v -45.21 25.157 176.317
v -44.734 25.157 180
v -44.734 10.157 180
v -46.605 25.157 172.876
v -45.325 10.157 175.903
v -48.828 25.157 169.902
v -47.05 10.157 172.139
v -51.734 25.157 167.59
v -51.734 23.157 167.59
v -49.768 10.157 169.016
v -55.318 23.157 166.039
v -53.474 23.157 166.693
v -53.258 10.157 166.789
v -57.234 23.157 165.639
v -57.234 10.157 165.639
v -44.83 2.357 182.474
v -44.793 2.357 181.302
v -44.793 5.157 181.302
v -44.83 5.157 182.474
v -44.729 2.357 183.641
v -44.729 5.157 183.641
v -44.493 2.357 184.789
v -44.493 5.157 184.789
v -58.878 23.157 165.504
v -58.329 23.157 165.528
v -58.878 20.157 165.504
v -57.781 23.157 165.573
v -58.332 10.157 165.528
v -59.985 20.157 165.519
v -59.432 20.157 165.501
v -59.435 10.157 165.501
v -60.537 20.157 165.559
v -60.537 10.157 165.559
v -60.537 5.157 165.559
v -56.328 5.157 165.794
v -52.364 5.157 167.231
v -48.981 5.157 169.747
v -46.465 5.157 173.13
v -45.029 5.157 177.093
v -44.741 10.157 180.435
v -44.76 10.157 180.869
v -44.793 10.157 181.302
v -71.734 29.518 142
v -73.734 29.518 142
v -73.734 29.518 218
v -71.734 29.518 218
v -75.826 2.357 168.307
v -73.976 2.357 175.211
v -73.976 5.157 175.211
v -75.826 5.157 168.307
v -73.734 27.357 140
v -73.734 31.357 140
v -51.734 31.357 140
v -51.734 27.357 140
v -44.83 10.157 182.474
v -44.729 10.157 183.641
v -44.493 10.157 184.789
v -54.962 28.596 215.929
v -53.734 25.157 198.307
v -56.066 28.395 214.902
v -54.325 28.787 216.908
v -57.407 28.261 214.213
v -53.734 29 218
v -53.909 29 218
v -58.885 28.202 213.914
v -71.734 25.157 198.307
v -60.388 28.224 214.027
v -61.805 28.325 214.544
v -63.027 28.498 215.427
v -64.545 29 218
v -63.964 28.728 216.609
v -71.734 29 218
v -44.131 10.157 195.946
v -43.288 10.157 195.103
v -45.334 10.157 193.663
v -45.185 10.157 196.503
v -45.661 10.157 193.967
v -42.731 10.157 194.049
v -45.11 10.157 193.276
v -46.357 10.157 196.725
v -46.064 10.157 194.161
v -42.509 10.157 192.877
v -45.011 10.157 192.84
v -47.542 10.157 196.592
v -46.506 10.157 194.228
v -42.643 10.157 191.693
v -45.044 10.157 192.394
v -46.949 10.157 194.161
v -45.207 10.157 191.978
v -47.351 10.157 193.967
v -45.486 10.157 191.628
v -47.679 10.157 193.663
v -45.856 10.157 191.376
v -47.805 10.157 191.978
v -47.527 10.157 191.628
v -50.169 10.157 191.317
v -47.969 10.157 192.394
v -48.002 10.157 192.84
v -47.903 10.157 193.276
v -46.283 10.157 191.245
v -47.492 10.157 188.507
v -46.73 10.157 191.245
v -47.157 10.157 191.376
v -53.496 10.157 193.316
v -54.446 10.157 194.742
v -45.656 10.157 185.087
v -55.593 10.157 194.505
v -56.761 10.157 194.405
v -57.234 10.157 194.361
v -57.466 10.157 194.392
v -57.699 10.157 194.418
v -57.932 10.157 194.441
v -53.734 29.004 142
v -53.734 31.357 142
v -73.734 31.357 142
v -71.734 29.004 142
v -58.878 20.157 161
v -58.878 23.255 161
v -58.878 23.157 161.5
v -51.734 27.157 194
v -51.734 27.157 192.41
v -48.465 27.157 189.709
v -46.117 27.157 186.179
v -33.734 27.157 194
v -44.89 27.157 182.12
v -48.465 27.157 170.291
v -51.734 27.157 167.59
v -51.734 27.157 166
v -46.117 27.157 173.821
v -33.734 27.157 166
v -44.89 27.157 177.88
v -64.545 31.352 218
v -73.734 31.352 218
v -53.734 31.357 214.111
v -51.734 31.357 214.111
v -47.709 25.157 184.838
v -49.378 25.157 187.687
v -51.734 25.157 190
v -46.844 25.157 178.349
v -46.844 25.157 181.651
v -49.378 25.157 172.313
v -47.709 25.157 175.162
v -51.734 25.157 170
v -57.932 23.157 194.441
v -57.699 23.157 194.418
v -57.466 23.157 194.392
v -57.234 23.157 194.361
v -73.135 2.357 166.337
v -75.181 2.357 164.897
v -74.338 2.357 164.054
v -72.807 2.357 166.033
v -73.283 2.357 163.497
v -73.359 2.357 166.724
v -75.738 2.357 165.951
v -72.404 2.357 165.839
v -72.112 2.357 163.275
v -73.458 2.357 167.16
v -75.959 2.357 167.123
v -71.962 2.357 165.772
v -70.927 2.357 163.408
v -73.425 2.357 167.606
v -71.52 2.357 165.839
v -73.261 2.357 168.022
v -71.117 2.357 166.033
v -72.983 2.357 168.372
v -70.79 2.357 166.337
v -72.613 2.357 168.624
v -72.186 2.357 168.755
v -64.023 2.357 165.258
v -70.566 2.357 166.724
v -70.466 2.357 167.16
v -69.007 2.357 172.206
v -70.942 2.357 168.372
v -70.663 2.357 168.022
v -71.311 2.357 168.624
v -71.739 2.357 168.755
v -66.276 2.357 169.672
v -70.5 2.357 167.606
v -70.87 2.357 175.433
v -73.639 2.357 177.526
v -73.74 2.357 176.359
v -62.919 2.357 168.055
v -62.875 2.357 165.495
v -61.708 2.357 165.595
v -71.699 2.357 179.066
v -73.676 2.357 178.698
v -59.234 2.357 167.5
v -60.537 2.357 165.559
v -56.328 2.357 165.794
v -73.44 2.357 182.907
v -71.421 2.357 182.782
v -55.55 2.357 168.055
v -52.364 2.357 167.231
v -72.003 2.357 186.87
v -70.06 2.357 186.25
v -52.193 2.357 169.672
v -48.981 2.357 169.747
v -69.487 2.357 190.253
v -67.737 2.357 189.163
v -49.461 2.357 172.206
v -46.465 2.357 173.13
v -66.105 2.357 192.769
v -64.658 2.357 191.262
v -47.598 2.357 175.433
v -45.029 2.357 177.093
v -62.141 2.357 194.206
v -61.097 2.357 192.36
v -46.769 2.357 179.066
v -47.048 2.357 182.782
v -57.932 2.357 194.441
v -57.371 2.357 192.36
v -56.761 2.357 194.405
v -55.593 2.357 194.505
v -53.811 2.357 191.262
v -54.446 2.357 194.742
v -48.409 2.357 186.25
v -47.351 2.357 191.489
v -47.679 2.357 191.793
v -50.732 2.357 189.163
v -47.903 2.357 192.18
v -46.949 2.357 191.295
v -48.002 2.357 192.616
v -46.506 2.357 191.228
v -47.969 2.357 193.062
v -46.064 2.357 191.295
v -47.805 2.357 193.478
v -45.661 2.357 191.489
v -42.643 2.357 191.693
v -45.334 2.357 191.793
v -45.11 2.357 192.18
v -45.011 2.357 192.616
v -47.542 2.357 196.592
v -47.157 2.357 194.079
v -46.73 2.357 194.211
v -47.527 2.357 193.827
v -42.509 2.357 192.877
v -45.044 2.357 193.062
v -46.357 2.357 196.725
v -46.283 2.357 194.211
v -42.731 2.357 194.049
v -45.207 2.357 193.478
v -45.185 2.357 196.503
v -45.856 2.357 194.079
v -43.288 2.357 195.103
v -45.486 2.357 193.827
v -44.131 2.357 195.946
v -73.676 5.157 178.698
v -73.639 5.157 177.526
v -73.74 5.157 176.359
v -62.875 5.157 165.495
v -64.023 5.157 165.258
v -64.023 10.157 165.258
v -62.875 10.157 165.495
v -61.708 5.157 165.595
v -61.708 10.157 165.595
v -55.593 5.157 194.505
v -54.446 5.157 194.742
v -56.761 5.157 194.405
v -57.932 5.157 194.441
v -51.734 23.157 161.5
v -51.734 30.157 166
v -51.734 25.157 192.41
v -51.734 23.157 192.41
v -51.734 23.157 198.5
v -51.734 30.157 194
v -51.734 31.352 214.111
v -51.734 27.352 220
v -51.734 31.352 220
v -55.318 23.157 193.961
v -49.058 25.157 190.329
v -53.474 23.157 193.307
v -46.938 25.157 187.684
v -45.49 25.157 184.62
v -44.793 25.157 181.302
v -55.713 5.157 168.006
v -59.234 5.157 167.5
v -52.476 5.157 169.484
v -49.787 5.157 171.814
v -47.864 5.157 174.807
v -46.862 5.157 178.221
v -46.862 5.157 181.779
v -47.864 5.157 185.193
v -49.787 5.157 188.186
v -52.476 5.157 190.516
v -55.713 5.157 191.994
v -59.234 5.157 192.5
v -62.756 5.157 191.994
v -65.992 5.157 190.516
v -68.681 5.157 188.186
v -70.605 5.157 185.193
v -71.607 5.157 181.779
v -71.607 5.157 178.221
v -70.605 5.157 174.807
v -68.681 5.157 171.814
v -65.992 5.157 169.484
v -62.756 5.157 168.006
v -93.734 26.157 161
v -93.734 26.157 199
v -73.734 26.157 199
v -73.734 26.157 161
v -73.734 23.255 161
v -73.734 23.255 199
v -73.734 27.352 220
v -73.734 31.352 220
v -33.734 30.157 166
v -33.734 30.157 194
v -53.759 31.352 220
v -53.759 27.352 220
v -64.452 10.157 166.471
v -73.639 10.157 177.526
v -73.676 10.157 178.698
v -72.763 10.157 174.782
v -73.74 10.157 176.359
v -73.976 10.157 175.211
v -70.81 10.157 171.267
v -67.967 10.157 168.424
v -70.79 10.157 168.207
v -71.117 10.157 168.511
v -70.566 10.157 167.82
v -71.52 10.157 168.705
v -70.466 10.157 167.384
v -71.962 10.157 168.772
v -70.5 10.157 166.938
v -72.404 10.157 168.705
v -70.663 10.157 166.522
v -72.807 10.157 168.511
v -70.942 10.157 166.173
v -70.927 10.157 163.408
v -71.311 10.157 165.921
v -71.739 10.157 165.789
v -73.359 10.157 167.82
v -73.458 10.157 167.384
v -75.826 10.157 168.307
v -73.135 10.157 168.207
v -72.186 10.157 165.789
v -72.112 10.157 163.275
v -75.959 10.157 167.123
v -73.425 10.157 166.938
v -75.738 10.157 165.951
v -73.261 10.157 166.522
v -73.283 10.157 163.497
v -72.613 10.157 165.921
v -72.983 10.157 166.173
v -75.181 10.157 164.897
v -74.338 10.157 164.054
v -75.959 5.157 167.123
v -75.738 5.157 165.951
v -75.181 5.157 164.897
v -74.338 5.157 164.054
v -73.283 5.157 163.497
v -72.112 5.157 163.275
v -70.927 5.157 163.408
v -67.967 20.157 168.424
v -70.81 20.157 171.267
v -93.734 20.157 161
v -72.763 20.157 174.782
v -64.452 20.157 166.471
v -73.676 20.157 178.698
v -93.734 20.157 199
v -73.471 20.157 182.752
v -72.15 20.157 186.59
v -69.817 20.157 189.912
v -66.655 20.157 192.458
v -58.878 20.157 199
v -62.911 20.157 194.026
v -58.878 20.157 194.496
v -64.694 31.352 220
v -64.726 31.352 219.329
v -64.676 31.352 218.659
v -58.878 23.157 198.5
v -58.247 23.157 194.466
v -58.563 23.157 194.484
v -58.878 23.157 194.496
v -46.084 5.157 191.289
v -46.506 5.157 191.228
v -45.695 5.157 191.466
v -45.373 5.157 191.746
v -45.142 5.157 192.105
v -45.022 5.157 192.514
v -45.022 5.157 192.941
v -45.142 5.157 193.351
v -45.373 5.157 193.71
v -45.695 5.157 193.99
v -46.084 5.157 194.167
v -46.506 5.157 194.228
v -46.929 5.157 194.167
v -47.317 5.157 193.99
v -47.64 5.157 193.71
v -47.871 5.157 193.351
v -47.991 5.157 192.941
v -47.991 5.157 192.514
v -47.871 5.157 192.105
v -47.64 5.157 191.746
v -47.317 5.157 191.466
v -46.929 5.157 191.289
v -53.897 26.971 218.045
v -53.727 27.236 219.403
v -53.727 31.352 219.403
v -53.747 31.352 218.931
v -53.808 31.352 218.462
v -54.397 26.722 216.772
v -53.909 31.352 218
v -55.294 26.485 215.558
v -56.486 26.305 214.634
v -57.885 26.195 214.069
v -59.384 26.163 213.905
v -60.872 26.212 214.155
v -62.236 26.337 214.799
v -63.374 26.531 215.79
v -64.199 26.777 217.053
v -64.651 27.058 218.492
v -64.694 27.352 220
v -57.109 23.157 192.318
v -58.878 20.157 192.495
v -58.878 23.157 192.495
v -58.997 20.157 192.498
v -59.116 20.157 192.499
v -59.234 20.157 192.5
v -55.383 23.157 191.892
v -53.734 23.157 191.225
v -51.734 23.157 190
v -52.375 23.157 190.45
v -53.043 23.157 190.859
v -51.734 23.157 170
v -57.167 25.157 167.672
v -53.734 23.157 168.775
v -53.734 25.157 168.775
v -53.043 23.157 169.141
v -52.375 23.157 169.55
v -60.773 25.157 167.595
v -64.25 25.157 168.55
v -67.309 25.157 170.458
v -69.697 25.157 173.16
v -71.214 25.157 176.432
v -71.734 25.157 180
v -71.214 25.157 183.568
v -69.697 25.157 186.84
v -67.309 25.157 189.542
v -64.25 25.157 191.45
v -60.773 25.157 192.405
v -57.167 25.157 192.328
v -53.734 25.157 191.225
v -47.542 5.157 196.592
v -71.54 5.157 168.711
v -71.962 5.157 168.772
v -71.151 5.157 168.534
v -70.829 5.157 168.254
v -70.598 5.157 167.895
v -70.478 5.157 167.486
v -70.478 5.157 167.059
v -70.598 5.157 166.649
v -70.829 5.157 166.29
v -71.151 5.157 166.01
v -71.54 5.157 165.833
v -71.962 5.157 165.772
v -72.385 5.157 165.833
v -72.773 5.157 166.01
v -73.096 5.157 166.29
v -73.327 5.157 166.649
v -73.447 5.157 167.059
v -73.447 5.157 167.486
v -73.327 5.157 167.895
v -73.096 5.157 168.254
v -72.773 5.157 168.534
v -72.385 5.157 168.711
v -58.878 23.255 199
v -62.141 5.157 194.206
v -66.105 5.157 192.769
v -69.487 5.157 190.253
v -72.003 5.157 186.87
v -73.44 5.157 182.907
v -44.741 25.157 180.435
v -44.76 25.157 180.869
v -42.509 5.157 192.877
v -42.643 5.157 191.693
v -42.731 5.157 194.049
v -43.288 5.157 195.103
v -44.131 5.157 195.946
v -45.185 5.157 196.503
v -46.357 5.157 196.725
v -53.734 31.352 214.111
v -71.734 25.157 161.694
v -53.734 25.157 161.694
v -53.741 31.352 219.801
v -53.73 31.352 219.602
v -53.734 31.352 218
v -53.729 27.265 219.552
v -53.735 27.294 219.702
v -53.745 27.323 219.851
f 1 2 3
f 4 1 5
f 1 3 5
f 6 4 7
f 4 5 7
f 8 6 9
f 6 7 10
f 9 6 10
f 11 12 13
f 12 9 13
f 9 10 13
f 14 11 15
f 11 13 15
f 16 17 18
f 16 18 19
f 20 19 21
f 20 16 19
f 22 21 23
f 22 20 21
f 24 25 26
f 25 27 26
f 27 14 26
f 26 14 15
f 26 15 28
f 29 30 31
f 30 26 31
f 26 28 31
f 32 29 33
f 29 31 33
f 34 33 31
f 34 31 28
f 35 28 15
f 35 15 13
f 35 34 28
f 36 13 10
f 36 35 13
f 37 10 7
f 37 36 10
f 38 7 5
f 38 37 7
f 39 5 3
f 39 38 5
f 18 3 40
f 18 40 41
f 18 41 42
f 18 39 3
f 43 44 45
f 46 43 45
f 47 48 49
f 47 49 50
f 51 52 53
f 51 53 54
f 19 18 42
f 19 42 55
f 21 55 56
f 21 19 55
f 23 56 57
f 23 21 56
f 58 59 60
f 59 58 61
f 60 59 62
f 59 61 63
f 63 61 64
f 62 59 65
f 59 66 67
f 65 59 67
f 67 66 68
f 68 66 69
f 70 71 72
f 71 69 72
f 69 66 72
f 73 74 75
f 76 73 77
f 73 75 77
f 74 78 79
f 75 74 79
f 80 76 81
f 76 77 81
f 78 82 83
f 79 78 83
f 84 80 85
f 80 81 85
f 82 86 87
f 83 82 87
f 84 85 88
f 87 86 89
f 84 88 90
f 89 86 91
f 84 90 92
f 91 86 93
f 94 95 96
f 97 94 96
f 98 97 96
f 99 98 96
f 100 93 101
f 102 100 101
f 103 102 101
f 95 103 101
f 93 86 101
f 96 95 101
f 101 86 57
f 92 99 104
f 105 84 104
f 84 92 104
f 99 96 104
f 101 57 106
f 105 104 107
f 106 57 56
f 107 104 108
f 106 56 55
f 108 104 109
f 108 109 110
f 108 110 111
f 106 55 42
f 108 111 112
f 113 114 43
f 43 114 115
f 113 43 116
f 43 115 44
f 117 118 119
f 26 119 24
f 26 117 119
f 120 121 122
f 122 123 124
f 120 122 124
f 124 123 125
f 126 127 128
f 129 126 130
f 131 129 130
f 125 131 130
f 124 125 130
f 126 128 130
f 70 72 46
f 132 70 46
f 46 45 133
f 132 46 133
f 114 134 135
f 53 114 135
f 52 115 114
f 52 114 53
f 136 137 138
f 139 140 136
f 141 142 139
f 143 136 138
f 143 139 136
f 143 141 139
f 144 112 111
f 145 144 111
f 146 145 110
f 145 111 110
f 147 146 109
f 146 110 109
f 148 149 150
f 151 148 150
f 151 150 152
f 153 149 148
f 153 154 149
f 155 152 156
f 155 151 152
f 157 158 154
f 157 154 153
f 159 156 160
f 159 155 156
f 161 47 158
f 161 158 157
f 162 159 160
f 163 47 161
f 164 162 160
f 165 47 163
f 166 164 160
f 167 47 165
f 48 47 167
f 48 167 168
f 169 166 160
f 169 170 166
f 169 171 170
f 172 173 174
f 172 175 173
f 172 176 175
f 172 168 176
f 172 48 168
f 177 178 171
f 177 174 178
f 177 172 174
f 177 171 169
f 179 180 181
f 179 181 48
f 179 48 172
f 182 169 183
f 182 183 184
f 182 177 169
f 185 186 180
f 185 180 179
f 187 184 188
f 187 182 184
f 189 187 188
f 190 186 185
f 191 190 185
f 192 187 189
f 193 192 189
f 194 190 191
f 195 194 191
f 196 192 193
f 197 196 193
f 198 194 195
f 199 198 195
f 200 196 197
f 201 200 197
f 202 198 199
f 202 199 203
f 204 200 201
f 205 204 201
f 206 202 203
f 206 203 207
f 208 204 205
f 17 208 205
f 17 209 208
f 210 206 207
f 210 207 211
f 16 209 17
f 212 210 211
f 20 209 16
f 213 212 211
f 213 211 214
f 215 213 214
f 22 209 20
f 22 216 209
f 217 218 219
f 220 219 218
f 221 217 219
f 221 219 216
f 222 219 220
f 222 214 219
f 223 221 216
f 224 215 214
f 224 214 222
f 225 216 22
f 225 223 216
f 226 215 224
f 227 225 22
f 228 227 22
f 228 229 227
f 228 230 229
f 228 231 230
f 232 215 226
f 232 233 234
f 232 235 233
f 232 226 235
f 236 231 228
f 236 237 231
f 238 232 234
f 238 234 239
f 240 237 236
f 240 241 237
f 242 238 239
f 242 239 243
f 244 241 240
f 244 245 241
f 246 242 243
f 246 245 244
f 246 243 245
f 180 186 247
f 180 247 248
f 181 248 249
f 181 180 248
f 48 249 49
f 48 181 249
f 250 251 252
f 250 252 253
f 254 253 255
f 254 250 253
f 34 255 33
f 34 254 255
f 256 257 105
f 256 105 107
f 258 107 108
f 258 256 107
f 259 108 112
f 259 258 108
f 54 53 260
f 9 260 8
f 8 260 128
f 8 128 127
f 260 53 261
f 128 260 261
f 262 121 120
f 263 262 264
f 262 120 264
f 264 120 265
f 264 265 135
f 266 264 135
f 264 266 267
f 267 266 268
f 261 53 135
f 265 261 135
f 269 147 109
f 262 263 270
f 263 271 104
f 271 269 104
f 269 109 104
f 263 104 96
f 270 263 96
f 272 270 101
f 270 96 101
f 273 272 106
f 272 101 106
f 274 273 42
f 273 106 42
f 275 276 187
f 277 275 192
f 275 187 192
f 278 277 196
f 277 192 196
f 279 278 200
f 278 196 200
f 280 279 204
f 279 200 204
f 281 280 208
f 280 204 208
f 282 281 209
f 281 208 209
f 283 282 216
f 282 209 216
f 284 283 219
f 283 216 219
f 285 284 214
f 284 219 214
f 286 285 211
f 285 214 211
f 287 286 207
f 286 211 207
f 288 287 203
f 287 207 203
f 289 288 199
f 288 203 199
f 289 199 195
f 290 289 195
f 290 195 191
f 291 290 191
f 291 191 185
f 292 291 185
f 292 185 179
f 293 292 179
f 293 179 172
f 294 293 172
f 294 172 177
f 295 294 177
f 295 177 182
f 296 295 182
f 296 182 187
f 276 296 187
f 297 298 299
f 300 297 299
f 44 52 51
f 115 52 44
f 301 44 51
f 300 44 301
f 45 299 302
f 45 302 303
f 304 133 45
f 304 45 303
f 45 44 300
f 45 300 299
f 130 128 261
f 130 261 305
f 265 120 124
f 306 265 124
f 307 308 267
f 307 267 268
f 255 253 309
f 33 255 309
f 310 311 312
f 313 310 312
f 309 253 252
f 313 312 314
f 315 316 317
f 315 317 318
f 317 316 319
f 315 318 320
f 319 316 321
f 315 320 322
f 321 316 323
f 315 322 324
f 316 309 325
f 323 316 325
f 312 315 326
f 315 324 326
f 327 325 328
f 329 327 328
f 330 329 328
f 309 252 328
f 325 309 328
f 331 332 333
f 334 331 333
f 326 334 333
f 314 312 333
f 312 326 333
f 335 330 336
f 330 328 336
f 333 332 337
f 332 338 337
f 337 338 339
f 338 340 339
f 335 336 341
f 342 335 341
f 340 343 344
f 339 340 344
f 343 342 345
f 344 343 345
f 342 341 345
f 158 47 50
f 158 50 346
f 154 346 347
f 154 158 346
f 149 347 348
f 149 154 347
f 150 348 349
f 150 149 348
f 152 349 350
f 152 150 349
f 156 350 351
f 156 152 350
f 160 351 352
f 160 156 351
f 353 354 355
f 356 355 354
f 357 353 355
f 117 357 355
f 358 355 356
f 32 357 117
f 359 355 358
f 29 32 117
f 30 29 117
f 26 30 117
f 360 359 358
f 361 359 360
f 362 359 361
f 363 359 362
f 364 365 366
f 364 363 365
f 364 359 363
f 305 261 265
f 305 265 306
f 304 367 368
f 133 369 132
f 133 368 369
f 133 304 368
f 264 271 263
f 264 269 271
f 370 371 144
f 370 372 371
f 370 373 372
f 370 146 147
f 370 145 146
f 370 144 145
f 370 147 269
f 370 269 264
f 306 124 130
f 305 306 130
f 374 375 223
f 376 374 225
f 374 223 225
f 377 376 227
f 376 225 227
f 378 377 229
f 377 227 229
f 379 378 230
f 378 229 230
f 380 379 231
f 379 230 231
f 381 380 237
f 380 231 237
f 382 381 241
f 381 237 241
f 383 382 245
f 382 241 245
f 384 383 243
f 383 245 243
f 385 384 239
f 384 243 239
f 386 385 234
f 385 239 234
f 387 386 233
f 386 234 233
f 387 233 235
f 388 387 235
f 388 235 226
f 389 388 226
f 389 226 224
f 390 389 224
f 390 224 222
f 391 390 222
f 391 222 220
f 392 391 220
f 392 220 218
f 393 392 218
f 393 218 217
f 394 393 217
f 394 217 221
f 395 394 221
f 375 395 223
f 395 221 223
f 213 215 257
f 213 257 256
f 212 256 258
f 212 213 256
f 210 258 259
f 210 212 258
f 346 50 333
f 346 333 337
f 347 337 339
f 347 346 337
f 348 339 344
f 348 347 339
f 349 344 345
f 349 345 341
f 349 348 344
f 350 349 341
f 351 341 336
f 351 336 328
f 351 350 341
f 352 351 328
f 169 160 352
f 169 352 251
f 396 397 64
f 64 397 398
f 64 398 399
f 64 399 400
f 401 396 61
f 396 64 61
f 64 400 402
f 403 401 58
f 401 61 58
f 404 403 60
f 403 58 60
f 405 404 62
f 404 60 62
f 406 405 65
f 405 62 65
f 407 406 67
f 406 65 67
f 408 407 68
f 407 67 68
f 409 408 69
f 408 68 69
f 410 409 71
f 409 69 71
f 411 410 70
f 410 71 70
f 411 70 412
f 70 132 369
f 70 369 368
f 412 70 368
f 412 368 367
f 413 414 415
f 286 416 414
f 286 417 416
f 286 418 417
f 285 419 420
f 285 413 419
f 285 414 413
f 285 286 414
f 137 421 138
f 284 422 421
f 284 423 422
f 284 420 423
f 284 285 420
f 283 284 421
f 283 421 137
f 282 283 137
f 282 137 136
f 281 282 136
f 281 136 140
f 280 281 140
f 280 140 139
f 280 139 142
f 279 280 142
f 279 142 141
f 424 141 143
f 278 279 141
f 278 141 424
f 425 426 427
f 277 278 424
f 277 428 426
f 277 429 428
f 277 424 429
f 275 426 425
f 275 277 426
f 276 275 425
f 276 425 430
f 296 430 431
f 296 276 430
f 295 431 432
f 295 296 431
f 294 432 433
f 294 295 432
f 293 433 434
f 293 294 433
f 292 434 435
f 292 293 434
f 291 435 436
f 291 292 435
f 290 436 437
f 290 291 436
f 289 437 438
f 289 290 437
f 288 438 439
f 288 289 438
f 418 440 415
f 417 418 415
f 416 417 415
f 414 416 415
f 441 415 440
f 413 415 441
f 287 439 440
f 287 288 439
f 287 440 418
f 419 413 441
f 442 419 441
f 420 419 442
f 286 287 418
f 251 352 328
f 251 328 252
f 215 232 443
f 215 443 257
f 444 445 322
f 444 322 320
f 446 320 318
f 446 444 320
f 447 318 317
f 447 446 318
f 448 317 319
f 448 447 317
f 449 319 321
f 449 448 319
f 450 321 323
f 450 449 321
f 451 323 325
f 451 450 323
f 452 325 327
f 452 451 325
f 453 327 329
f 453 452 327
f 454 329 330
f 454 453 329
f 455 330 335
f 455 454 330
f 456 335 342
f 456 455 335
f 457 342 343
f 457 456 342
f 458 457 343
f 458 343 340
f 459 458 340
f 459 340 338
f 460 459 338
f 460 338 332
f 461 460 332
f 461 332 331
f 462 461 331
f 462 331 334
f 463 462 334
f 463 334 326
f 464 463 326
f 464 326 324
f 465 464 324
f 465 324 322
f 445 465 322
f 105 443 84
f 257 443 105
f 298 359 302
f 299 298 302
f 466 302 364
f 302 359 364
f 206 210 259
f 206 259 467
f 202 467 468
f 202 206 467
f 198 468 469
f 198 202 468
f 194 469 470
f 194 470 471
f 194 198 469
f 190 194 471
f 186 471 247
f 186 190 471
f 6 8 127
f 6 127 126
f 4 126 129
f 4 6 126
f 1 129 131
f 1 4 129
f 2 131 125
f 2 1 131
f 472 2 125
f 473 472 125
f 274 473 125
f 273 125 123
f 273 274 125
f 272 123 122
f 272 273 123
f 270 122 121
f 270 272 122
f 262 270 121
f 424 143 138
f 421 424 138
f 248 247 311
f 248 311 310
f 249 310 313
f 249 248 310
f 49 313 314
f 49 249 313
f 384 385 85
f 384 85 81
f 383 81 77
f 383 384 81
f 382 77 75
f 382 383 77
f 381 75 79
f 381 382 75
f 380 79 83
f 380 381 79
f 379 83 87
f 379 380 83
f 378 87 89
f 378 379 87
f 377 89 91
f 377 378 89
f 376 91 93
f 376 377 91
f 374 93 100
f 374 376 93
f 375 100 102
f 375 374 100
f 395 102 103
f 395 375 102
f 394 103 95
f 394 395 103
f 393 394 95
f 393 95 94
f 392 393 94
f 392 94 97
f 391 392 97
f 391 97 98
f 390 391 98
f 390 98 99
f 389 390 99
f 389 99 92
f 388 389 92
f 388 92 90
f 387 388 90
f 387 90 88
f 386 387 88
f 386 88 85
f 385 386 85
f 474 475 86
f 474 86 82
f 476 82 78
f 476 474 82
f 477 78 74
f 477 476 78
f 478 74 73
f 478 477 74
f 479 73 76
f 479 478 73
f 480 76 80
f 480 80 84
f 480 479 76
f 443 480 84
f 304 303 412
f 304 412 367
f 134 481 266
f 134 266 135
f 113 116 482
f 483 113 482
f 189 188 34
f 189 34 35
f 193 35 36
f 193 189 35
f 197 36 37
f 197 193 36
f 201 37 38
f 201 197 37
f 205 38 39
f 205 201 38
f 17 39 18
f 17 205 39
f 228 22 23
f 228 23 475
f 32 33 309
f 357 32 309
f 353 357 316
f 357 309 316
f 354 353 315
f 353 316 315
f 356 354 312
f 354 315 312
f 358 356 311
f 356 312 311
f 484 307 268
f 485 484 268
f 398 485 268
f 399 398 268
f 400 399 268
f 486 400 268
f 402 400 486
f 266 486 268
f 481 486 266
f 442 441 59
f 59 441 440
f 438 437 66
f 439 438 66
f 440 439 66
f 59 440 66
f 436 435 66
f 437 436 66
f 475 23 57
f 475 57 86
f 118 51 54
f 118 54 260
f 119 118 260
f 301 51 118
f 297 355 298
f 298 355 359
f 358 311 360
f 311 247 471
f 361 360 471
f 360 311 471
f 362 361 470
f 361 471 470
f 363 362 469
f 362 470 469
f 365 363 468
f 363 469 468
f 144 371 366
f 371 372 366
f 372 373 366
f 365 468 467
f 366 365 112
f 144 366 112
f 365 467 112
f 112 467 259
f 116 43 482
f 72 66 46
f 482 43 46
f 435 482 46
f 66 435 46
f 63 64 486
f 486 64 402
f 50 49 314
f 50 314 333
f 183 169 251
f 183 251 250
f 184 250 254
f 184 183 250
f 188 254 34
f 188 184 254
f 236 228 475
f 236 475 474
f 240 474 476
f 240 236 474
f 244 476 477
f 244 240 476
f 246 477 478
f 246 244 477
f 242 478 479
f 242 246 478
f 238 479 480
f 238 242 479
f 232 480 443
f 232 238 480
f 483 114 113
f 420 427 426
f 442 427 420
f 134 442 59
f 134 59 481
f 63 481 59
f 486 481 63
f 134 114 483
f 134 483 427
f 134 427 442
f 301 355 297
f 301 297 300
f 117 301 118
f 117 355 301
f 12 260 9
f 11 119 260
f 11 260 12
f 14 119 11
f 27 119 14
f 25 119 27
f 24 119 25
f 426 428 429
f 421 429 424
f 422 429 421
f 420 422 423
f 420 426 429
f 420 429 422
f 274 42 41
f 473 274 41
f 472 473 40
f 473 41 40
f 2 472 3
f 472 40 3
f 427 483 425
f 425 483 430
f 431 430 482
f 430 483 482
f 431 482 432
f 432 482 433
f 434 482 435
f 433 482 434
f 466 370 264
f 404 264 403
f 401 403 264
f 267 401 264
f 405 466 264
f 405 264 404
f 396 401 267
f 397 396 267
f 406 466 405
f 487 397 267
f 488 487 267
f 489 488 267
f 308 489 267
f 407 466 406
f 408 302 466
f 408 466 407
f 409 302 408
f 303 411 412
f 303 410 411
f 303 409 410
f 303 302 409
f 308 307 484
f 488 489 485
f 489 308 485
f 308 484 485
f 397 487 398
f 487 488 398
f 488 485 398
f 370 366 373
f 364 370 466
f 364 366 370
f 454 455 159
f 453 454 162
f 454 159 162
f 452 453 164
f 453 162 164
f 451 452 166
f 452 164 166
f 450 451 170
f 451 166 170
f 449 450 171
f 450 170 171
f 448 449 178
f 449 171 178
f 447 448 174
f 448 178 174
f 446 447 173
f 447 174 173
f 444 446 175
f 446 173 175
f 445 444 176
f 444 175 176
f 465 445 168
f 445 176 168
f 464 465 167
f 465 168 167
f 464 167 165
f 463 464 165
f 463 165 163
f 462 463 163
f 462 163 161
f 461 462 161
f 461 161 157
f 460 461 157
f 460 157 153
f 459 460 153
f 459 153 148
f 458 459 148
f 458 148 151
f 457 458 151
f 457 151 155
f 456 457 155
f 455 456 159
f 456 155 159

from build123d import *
from build123d.topology import SkipClean

# Parameters (mm, degrees)
SKETCH_1_R               = 12.5
SKETCH_1_R_2             = 1.5
EXTRUDE_1_DEPTH          = 5
SKETCH_2_R               = 12.5
EXTRUDE_2_DEPTH          = 15
EXTRUDE_4_DEPTH          = 22
EXTRUDE_5_DEPTH          = 2
SKETCH_11_W              = 34.855942827
SKETCH_11_H              = 38
EXTRUDE_7_DEPTH          = 3
CUT_EXTRUDE_2_DEPTH      = 240.812701315
CUT_EXTRUDE_2_DEPTH_BACK = 240.812701315
CUT_EXTRUDE_3_DEPTH      = 9
CUT_EXTRUDE_4_REACH      = 226.407
EXTRUDE_START            = 2.8
SKETCH_12_R              = 12.5
SKETCH_12_R_2            = 1.5
EXTRUDE_8_DEPTH          = 2.8
SKETCH_10_W              = 18
SKETCH_10_H              = 28
EXTRUDE_6_DEPTH          = 3
SKETCH_4_R               = 5.5
CUT_EXTRUDE_1_DEPTH      = 10


with BuildPart() as part:
    # 草圖1 → 填料-伸長1 (new body)
    with BuildSketch(Plane(origin=(0, 5.156954032, 0), x_dir=(1, 0, 0), z_dir=(0, 1, 0))):
        with BuildLine():
            ThreePointArc((-44.792972571, -181.302345222), (-44.796491977, -183.058763578), (-44.492647899, -184.788704792))
            Line((-44.492647899, -184.788704792), (-42.64274246, -191.692645881))
            ThreePointArc((-42.64274246, -191.692645881), (-43.67801864, -195.556349186), (-47.541721945, -196.591625367))
            Line((-47.541721945, -196.591625367), (-54.445663034, -194.741719927))
            ThreePointArc((-54.445663034, -194.741719927), (-56.175604248, -194.43787585), (-57.932022604, -194.441395255))
            ThreePointArc((-57.932022604, -194.441395255), (-69.487416154, -190.253048327), (-73.675763082, -178.697654778))
            ThreePointArc((-73.675763082, -178.697654778), (-73.672243676, -176.941236422), (-73.976087754, -175.211295208))
            Line((-73.976087754, -175.211295208), (-75.825993193, -168.307354119))
            ThreePointArc((-75.825993193, -168.307354119), (-74.790717013, -164.443650814), (-70.927013707, -163.408374633))
            Line((-70.927013707, -163.408374633), (-64.023072619, -165.258280073))
            ThreePointArc((-64.023072619, -165.258280073), (-62.293131405, -165.56212415), (-60.536713049, -165.558604745))
            ThreePointArc((-60.536713049, -165.558604745), (-48.981319499, -169.746951673), (-44.792972571, -181.302345222))
        make_face()
        with Locations(Location((-59.234367826, -180, 0), (0, 0, 270))):
            Circle(SKETCH_1_R, mode=Mode.SUBTRACT)
        with Locations(Location((-71.962289888, -167.272077939, 0), (0, 0, 270))):
            Circle(SKETCH_1_R_2, mode=Mode.SUBTRACT)
        with Locations(Location((-46.506445765, -192.727922061, 0), (0, 0, 270))):
            Circle(SKETCH_1_R_2, mode=Mode.SUBTRACT)
    extrude(amount=EXTRUDE_1_DEPTH)

    # 草圖2 → 填料-伸長2 (add)
    with SkipClean():  # the faces are left unmerged after this step: merging them gives an invalid solid
        with BuildSketch(Plane(origin=(0, 10.156954032, 0), x_dir=(1, 0, 0), z_dir=(0, 1, 0))):
            with BuildLine():
                ThreePointArc((-57.932022604, -194.441395255), (-57.58271092, -194.405624924), (-57.234367826, -194.361406616))
                ThreePointArc((-57.234367826, -194.361406616), (-48.736051742, -190.001767813), (-44.792972571, -181.302345222))
                ThreePointArc((-44.792972571, -181.302345222), (-44.749026422, -180.651831572), (-44.734367826, -180))
                ThreePointArc((-44.734367826, -180), (-48.297046399, -170.480283618), (-57.234367826, -165.638593384))
                ThreePointArc((-57.234367826, -165.638593384), (-58.883255177, -165.504251661), (-60.536713049, -165.558604745))
                ThreePointArc((-60.536713049, -165.558604745), (-69.487416154, -169.746951673), (-73.675763082, -178.697654778))
                ThreePointArc((-73.675763082, -178.697654778), (-69.487416154, -190.253048327), (-57.932022604, -194.441395255))
            make_face()
            with Locations(Location((-59.234367826, -180, 0), (0, 0, 270))):
                Circle(SKETCH_2_R, mode=Mode.SUBTRACT)
        extrude(amount=EXTRUDE_2_DEPTH)

    # 草圖3 → 填料-伸長4 (add)
    with SkipClean():  # the faces are left unmerged after this step: merging them gives an invalid solid
        with BuildSketch(Plane.ZY.offset(73.734367826)):
            Polygon((220, 27.352075983), (220, 31.351675277), (214.110829696, 31.351675277), (214.110829696, 31.356954032), (140, 31.356954032), (140, 27.356954032), (161.5, 23.156954032), (180, 23.156954032), (198.5, 23.156954032), align=None)
        extrude(amount=-EXTRUDE_4_DEPTH)

    # 草圖5 → 填料-伸長5 (add)
    with SkipClean():  # the faces are left unmerged after this step: merging them gives an invalid solid
        with BuildSketch(Plane(origin=(0, 25.156954032, 0), x_dir=(1, 0, 0), z_dir=(0, 1, 0))):
            with BuildLine():
                Line((-51.734367826, -192.409673646), (-51.734367826, -167.590326354))
                ThreePointArc((-51.734367826, -167.590326354), (-44.734367826, -180), (-51.734367826, -192.409673646))
            make_face()
        extrude(amount=EXTRUDE_5_DEPTH)

    # 草圖11 → 填料-伸長7 (add, symmetric)
    with SkipClean():  # the faces are left unmerged after this step: merging them gives an invalid solid
        with BuildSketch(Plane.XZ.offset(-23.156954032)):
            with Locations((-76.306396413, 180)):
                Rectangle(SKETCH_11_W, SKETCH_11_H)
        extrude(amount=EXTRUDE_7_DEPTH, both=True)

    # 草圖6 → 除料-伸長2 (cut, two sides: drawn at the far end of the back side and taken through both)
    with SkipClean():  # the faces are left unmerged after this step: merging them gives an invalid solid
        with BuildSketch(Plane.XZ.offset(-23.156954032).offset(-CUT_EXTRUDE_2_DEPTH_BACK)):
            with BuildLine():
                Line((-53.734367826, 168.77502784), (-53.734367826, 191.22497216))
                ThreePointArc((-53.734367826, 191.22497216), (-71.734367826, 180), (-53.734367826, 168.77502784))
            make_face()
        extrude(amount=CUT_EXTRUDE_2_DEPTH + CUT_EXTRUDE_2_DEPTH_BACK, mode=Mode.SUBTRACT)

    # 草圖7 → 除料-伸長3 (cut, symmetric)
    with SkipClean():  # the faces are left unmerged after this step: merging them gives an invalid solid
        with BuildSketch(Plane.ZY.offset(62.734367826)):
            Polygon((218, 29.351675277), (218, 40.942624065), (142, 40.942624065), (142, 29.356954032), (142, 29.004060242), (161.693519886, 25.156954032), (180, 25.156954032), (198.306700713, 25.156954032), (218, 28.999549015), align=None)
        extrude(amount=CUT_EXTRUDE_3_DEPTH, both=True, mode=Mode.SUBTRACT)

    # 草圖9 → 除料-伸長4 (cut, up to next)
    with BuildSketch(Plane.ZY.offset(73.734367826), mode=Mode.PRIVATE) as cut_extrude_4_sk1:
        Polygon((142, 31.523455744), (142, 29.51817699), (218, 29.51817699), (218, 31.51817699), align=None)
    cut_extrude_4_tool1 = extrude(cut_extrude_4_sk1.sketch, amount=-CUT_EXTRUDE_4_REACH, mode=Mode.PRIVATE) & part.part
    add(cut_extrude_4_tool1.solids().sort_by_distance((-73.734368, 30.519497, 179.983306))[0], mode=Mode.SUBTRACT)

    # 草圖12 → 填料-伸長8 (add)
    with SkipClean():  # the faces are left unmerged after this step: merging them gives an invalid solid
        with BuildSketch(Plane.XZ.offset(-5.156954032).offset(EXTRUDE_START)):
            with BuildLine():
                Line((-44.492647899, 184.788704792), (-42.64274246, 191.692645881))
                ThreePointArc((-42.64274246, 191.692645881), (-43.67801864, 195.556349186), (-47.541721945, 196.591625367))
                Line((-47.541721945, 196.591625367), (-54.445663034, 194.741719927))
                ThreePointArc((-54.445663034, 194.741719927), (-56.175604248, 194.43787585), (-57.932022604, 194.441395255))
                ThreePointArc((-57.932022604, 194.441395255), (-69.487416154, 190.253048327), (-73.675763082, 178.697654778))
                ThreePointArc((-73.675763082, 178.697654778), (-73.672243676, 176.941236422), (-73.976087754, 175.211295208))
                Line((-73.976087754, 175.211295208), (-75.825993193, 168.307354119))
                ThreePointArc((-75.825993193, 168.307354119), (-74.790717013, 164.443650814), (-70.927013707, 163.408374633))
                Line((-70.927013707, 163.408374633), (-64.023072619, 165.258280073))
                ThreePointArc((-64.023072619, 165.258280073), (-62.293131405, 165.56212415), (-60.536713049, 165.558604745))
                ThreePointArc((-60.536713049, 165.558604745), (-48.981319499, 169.746951673), (-44.792972571, 181.302345222))
                ThreePointArc((-44.792972571, 181.302345222), (-44.796491977, 183.058763578), (-44.492647899, 184.788704792))
            make_face()
            with Locations(Location((-59.234367826, 180, 0), (0, 0, 270))):
                Circle(SKETCH_12_R, mode=Mode.SUBTRACT)
            with Locations(Location((-71.962289888, 167.272077939, 0), (0, 0, 270))):
                Circle(SKETCH_12_R_2, mode=Mode.SUBTRACT)
            with Locations(Location((-46.506445765, 192.727922061, 0), (0, 0, 270))):
                Circle(SKETCH_12_R_2, mode=Mode.SUBTRACT)
        extrude(amount=-EXTRUDE_8_DEPTH)

    # 草圖10 → 填料-伸長6 (add)
    with SkipClean():  # the faces are left unmerged after this step: merging them gives an invalid solid
        with BuildSketch(Plane(origin=(0, 27.156954032, 0), x_dir=(1, 0, 0), z_dir=(0, 1, 0))):
            with Locations((-42.734367826, -180)):
                Rectangle(SKETCH_10_W, SKETCH_10_H)
        extrude(amount=EXTRUDE_6_DEPTH)

    # 草圖4 → 除料-伸長1 (cut)
    with SkipClean():  # the faces are left unmerged after this step: merging them gives an invalid solid
        with BuildSketch(Plane(origin=(0, 31.351675277, 0), x_dir=(1, 0, 0), z_dir=(0, 1, 0))):
            with Locations((-59.226743272, -219.402909175)):
                Circle(SKETCH_4_R)
        extrude(amount=-CUT_EXTRUDE_1_DEPTH, mode=Mode.SUBTRACT)


solid = part.part
